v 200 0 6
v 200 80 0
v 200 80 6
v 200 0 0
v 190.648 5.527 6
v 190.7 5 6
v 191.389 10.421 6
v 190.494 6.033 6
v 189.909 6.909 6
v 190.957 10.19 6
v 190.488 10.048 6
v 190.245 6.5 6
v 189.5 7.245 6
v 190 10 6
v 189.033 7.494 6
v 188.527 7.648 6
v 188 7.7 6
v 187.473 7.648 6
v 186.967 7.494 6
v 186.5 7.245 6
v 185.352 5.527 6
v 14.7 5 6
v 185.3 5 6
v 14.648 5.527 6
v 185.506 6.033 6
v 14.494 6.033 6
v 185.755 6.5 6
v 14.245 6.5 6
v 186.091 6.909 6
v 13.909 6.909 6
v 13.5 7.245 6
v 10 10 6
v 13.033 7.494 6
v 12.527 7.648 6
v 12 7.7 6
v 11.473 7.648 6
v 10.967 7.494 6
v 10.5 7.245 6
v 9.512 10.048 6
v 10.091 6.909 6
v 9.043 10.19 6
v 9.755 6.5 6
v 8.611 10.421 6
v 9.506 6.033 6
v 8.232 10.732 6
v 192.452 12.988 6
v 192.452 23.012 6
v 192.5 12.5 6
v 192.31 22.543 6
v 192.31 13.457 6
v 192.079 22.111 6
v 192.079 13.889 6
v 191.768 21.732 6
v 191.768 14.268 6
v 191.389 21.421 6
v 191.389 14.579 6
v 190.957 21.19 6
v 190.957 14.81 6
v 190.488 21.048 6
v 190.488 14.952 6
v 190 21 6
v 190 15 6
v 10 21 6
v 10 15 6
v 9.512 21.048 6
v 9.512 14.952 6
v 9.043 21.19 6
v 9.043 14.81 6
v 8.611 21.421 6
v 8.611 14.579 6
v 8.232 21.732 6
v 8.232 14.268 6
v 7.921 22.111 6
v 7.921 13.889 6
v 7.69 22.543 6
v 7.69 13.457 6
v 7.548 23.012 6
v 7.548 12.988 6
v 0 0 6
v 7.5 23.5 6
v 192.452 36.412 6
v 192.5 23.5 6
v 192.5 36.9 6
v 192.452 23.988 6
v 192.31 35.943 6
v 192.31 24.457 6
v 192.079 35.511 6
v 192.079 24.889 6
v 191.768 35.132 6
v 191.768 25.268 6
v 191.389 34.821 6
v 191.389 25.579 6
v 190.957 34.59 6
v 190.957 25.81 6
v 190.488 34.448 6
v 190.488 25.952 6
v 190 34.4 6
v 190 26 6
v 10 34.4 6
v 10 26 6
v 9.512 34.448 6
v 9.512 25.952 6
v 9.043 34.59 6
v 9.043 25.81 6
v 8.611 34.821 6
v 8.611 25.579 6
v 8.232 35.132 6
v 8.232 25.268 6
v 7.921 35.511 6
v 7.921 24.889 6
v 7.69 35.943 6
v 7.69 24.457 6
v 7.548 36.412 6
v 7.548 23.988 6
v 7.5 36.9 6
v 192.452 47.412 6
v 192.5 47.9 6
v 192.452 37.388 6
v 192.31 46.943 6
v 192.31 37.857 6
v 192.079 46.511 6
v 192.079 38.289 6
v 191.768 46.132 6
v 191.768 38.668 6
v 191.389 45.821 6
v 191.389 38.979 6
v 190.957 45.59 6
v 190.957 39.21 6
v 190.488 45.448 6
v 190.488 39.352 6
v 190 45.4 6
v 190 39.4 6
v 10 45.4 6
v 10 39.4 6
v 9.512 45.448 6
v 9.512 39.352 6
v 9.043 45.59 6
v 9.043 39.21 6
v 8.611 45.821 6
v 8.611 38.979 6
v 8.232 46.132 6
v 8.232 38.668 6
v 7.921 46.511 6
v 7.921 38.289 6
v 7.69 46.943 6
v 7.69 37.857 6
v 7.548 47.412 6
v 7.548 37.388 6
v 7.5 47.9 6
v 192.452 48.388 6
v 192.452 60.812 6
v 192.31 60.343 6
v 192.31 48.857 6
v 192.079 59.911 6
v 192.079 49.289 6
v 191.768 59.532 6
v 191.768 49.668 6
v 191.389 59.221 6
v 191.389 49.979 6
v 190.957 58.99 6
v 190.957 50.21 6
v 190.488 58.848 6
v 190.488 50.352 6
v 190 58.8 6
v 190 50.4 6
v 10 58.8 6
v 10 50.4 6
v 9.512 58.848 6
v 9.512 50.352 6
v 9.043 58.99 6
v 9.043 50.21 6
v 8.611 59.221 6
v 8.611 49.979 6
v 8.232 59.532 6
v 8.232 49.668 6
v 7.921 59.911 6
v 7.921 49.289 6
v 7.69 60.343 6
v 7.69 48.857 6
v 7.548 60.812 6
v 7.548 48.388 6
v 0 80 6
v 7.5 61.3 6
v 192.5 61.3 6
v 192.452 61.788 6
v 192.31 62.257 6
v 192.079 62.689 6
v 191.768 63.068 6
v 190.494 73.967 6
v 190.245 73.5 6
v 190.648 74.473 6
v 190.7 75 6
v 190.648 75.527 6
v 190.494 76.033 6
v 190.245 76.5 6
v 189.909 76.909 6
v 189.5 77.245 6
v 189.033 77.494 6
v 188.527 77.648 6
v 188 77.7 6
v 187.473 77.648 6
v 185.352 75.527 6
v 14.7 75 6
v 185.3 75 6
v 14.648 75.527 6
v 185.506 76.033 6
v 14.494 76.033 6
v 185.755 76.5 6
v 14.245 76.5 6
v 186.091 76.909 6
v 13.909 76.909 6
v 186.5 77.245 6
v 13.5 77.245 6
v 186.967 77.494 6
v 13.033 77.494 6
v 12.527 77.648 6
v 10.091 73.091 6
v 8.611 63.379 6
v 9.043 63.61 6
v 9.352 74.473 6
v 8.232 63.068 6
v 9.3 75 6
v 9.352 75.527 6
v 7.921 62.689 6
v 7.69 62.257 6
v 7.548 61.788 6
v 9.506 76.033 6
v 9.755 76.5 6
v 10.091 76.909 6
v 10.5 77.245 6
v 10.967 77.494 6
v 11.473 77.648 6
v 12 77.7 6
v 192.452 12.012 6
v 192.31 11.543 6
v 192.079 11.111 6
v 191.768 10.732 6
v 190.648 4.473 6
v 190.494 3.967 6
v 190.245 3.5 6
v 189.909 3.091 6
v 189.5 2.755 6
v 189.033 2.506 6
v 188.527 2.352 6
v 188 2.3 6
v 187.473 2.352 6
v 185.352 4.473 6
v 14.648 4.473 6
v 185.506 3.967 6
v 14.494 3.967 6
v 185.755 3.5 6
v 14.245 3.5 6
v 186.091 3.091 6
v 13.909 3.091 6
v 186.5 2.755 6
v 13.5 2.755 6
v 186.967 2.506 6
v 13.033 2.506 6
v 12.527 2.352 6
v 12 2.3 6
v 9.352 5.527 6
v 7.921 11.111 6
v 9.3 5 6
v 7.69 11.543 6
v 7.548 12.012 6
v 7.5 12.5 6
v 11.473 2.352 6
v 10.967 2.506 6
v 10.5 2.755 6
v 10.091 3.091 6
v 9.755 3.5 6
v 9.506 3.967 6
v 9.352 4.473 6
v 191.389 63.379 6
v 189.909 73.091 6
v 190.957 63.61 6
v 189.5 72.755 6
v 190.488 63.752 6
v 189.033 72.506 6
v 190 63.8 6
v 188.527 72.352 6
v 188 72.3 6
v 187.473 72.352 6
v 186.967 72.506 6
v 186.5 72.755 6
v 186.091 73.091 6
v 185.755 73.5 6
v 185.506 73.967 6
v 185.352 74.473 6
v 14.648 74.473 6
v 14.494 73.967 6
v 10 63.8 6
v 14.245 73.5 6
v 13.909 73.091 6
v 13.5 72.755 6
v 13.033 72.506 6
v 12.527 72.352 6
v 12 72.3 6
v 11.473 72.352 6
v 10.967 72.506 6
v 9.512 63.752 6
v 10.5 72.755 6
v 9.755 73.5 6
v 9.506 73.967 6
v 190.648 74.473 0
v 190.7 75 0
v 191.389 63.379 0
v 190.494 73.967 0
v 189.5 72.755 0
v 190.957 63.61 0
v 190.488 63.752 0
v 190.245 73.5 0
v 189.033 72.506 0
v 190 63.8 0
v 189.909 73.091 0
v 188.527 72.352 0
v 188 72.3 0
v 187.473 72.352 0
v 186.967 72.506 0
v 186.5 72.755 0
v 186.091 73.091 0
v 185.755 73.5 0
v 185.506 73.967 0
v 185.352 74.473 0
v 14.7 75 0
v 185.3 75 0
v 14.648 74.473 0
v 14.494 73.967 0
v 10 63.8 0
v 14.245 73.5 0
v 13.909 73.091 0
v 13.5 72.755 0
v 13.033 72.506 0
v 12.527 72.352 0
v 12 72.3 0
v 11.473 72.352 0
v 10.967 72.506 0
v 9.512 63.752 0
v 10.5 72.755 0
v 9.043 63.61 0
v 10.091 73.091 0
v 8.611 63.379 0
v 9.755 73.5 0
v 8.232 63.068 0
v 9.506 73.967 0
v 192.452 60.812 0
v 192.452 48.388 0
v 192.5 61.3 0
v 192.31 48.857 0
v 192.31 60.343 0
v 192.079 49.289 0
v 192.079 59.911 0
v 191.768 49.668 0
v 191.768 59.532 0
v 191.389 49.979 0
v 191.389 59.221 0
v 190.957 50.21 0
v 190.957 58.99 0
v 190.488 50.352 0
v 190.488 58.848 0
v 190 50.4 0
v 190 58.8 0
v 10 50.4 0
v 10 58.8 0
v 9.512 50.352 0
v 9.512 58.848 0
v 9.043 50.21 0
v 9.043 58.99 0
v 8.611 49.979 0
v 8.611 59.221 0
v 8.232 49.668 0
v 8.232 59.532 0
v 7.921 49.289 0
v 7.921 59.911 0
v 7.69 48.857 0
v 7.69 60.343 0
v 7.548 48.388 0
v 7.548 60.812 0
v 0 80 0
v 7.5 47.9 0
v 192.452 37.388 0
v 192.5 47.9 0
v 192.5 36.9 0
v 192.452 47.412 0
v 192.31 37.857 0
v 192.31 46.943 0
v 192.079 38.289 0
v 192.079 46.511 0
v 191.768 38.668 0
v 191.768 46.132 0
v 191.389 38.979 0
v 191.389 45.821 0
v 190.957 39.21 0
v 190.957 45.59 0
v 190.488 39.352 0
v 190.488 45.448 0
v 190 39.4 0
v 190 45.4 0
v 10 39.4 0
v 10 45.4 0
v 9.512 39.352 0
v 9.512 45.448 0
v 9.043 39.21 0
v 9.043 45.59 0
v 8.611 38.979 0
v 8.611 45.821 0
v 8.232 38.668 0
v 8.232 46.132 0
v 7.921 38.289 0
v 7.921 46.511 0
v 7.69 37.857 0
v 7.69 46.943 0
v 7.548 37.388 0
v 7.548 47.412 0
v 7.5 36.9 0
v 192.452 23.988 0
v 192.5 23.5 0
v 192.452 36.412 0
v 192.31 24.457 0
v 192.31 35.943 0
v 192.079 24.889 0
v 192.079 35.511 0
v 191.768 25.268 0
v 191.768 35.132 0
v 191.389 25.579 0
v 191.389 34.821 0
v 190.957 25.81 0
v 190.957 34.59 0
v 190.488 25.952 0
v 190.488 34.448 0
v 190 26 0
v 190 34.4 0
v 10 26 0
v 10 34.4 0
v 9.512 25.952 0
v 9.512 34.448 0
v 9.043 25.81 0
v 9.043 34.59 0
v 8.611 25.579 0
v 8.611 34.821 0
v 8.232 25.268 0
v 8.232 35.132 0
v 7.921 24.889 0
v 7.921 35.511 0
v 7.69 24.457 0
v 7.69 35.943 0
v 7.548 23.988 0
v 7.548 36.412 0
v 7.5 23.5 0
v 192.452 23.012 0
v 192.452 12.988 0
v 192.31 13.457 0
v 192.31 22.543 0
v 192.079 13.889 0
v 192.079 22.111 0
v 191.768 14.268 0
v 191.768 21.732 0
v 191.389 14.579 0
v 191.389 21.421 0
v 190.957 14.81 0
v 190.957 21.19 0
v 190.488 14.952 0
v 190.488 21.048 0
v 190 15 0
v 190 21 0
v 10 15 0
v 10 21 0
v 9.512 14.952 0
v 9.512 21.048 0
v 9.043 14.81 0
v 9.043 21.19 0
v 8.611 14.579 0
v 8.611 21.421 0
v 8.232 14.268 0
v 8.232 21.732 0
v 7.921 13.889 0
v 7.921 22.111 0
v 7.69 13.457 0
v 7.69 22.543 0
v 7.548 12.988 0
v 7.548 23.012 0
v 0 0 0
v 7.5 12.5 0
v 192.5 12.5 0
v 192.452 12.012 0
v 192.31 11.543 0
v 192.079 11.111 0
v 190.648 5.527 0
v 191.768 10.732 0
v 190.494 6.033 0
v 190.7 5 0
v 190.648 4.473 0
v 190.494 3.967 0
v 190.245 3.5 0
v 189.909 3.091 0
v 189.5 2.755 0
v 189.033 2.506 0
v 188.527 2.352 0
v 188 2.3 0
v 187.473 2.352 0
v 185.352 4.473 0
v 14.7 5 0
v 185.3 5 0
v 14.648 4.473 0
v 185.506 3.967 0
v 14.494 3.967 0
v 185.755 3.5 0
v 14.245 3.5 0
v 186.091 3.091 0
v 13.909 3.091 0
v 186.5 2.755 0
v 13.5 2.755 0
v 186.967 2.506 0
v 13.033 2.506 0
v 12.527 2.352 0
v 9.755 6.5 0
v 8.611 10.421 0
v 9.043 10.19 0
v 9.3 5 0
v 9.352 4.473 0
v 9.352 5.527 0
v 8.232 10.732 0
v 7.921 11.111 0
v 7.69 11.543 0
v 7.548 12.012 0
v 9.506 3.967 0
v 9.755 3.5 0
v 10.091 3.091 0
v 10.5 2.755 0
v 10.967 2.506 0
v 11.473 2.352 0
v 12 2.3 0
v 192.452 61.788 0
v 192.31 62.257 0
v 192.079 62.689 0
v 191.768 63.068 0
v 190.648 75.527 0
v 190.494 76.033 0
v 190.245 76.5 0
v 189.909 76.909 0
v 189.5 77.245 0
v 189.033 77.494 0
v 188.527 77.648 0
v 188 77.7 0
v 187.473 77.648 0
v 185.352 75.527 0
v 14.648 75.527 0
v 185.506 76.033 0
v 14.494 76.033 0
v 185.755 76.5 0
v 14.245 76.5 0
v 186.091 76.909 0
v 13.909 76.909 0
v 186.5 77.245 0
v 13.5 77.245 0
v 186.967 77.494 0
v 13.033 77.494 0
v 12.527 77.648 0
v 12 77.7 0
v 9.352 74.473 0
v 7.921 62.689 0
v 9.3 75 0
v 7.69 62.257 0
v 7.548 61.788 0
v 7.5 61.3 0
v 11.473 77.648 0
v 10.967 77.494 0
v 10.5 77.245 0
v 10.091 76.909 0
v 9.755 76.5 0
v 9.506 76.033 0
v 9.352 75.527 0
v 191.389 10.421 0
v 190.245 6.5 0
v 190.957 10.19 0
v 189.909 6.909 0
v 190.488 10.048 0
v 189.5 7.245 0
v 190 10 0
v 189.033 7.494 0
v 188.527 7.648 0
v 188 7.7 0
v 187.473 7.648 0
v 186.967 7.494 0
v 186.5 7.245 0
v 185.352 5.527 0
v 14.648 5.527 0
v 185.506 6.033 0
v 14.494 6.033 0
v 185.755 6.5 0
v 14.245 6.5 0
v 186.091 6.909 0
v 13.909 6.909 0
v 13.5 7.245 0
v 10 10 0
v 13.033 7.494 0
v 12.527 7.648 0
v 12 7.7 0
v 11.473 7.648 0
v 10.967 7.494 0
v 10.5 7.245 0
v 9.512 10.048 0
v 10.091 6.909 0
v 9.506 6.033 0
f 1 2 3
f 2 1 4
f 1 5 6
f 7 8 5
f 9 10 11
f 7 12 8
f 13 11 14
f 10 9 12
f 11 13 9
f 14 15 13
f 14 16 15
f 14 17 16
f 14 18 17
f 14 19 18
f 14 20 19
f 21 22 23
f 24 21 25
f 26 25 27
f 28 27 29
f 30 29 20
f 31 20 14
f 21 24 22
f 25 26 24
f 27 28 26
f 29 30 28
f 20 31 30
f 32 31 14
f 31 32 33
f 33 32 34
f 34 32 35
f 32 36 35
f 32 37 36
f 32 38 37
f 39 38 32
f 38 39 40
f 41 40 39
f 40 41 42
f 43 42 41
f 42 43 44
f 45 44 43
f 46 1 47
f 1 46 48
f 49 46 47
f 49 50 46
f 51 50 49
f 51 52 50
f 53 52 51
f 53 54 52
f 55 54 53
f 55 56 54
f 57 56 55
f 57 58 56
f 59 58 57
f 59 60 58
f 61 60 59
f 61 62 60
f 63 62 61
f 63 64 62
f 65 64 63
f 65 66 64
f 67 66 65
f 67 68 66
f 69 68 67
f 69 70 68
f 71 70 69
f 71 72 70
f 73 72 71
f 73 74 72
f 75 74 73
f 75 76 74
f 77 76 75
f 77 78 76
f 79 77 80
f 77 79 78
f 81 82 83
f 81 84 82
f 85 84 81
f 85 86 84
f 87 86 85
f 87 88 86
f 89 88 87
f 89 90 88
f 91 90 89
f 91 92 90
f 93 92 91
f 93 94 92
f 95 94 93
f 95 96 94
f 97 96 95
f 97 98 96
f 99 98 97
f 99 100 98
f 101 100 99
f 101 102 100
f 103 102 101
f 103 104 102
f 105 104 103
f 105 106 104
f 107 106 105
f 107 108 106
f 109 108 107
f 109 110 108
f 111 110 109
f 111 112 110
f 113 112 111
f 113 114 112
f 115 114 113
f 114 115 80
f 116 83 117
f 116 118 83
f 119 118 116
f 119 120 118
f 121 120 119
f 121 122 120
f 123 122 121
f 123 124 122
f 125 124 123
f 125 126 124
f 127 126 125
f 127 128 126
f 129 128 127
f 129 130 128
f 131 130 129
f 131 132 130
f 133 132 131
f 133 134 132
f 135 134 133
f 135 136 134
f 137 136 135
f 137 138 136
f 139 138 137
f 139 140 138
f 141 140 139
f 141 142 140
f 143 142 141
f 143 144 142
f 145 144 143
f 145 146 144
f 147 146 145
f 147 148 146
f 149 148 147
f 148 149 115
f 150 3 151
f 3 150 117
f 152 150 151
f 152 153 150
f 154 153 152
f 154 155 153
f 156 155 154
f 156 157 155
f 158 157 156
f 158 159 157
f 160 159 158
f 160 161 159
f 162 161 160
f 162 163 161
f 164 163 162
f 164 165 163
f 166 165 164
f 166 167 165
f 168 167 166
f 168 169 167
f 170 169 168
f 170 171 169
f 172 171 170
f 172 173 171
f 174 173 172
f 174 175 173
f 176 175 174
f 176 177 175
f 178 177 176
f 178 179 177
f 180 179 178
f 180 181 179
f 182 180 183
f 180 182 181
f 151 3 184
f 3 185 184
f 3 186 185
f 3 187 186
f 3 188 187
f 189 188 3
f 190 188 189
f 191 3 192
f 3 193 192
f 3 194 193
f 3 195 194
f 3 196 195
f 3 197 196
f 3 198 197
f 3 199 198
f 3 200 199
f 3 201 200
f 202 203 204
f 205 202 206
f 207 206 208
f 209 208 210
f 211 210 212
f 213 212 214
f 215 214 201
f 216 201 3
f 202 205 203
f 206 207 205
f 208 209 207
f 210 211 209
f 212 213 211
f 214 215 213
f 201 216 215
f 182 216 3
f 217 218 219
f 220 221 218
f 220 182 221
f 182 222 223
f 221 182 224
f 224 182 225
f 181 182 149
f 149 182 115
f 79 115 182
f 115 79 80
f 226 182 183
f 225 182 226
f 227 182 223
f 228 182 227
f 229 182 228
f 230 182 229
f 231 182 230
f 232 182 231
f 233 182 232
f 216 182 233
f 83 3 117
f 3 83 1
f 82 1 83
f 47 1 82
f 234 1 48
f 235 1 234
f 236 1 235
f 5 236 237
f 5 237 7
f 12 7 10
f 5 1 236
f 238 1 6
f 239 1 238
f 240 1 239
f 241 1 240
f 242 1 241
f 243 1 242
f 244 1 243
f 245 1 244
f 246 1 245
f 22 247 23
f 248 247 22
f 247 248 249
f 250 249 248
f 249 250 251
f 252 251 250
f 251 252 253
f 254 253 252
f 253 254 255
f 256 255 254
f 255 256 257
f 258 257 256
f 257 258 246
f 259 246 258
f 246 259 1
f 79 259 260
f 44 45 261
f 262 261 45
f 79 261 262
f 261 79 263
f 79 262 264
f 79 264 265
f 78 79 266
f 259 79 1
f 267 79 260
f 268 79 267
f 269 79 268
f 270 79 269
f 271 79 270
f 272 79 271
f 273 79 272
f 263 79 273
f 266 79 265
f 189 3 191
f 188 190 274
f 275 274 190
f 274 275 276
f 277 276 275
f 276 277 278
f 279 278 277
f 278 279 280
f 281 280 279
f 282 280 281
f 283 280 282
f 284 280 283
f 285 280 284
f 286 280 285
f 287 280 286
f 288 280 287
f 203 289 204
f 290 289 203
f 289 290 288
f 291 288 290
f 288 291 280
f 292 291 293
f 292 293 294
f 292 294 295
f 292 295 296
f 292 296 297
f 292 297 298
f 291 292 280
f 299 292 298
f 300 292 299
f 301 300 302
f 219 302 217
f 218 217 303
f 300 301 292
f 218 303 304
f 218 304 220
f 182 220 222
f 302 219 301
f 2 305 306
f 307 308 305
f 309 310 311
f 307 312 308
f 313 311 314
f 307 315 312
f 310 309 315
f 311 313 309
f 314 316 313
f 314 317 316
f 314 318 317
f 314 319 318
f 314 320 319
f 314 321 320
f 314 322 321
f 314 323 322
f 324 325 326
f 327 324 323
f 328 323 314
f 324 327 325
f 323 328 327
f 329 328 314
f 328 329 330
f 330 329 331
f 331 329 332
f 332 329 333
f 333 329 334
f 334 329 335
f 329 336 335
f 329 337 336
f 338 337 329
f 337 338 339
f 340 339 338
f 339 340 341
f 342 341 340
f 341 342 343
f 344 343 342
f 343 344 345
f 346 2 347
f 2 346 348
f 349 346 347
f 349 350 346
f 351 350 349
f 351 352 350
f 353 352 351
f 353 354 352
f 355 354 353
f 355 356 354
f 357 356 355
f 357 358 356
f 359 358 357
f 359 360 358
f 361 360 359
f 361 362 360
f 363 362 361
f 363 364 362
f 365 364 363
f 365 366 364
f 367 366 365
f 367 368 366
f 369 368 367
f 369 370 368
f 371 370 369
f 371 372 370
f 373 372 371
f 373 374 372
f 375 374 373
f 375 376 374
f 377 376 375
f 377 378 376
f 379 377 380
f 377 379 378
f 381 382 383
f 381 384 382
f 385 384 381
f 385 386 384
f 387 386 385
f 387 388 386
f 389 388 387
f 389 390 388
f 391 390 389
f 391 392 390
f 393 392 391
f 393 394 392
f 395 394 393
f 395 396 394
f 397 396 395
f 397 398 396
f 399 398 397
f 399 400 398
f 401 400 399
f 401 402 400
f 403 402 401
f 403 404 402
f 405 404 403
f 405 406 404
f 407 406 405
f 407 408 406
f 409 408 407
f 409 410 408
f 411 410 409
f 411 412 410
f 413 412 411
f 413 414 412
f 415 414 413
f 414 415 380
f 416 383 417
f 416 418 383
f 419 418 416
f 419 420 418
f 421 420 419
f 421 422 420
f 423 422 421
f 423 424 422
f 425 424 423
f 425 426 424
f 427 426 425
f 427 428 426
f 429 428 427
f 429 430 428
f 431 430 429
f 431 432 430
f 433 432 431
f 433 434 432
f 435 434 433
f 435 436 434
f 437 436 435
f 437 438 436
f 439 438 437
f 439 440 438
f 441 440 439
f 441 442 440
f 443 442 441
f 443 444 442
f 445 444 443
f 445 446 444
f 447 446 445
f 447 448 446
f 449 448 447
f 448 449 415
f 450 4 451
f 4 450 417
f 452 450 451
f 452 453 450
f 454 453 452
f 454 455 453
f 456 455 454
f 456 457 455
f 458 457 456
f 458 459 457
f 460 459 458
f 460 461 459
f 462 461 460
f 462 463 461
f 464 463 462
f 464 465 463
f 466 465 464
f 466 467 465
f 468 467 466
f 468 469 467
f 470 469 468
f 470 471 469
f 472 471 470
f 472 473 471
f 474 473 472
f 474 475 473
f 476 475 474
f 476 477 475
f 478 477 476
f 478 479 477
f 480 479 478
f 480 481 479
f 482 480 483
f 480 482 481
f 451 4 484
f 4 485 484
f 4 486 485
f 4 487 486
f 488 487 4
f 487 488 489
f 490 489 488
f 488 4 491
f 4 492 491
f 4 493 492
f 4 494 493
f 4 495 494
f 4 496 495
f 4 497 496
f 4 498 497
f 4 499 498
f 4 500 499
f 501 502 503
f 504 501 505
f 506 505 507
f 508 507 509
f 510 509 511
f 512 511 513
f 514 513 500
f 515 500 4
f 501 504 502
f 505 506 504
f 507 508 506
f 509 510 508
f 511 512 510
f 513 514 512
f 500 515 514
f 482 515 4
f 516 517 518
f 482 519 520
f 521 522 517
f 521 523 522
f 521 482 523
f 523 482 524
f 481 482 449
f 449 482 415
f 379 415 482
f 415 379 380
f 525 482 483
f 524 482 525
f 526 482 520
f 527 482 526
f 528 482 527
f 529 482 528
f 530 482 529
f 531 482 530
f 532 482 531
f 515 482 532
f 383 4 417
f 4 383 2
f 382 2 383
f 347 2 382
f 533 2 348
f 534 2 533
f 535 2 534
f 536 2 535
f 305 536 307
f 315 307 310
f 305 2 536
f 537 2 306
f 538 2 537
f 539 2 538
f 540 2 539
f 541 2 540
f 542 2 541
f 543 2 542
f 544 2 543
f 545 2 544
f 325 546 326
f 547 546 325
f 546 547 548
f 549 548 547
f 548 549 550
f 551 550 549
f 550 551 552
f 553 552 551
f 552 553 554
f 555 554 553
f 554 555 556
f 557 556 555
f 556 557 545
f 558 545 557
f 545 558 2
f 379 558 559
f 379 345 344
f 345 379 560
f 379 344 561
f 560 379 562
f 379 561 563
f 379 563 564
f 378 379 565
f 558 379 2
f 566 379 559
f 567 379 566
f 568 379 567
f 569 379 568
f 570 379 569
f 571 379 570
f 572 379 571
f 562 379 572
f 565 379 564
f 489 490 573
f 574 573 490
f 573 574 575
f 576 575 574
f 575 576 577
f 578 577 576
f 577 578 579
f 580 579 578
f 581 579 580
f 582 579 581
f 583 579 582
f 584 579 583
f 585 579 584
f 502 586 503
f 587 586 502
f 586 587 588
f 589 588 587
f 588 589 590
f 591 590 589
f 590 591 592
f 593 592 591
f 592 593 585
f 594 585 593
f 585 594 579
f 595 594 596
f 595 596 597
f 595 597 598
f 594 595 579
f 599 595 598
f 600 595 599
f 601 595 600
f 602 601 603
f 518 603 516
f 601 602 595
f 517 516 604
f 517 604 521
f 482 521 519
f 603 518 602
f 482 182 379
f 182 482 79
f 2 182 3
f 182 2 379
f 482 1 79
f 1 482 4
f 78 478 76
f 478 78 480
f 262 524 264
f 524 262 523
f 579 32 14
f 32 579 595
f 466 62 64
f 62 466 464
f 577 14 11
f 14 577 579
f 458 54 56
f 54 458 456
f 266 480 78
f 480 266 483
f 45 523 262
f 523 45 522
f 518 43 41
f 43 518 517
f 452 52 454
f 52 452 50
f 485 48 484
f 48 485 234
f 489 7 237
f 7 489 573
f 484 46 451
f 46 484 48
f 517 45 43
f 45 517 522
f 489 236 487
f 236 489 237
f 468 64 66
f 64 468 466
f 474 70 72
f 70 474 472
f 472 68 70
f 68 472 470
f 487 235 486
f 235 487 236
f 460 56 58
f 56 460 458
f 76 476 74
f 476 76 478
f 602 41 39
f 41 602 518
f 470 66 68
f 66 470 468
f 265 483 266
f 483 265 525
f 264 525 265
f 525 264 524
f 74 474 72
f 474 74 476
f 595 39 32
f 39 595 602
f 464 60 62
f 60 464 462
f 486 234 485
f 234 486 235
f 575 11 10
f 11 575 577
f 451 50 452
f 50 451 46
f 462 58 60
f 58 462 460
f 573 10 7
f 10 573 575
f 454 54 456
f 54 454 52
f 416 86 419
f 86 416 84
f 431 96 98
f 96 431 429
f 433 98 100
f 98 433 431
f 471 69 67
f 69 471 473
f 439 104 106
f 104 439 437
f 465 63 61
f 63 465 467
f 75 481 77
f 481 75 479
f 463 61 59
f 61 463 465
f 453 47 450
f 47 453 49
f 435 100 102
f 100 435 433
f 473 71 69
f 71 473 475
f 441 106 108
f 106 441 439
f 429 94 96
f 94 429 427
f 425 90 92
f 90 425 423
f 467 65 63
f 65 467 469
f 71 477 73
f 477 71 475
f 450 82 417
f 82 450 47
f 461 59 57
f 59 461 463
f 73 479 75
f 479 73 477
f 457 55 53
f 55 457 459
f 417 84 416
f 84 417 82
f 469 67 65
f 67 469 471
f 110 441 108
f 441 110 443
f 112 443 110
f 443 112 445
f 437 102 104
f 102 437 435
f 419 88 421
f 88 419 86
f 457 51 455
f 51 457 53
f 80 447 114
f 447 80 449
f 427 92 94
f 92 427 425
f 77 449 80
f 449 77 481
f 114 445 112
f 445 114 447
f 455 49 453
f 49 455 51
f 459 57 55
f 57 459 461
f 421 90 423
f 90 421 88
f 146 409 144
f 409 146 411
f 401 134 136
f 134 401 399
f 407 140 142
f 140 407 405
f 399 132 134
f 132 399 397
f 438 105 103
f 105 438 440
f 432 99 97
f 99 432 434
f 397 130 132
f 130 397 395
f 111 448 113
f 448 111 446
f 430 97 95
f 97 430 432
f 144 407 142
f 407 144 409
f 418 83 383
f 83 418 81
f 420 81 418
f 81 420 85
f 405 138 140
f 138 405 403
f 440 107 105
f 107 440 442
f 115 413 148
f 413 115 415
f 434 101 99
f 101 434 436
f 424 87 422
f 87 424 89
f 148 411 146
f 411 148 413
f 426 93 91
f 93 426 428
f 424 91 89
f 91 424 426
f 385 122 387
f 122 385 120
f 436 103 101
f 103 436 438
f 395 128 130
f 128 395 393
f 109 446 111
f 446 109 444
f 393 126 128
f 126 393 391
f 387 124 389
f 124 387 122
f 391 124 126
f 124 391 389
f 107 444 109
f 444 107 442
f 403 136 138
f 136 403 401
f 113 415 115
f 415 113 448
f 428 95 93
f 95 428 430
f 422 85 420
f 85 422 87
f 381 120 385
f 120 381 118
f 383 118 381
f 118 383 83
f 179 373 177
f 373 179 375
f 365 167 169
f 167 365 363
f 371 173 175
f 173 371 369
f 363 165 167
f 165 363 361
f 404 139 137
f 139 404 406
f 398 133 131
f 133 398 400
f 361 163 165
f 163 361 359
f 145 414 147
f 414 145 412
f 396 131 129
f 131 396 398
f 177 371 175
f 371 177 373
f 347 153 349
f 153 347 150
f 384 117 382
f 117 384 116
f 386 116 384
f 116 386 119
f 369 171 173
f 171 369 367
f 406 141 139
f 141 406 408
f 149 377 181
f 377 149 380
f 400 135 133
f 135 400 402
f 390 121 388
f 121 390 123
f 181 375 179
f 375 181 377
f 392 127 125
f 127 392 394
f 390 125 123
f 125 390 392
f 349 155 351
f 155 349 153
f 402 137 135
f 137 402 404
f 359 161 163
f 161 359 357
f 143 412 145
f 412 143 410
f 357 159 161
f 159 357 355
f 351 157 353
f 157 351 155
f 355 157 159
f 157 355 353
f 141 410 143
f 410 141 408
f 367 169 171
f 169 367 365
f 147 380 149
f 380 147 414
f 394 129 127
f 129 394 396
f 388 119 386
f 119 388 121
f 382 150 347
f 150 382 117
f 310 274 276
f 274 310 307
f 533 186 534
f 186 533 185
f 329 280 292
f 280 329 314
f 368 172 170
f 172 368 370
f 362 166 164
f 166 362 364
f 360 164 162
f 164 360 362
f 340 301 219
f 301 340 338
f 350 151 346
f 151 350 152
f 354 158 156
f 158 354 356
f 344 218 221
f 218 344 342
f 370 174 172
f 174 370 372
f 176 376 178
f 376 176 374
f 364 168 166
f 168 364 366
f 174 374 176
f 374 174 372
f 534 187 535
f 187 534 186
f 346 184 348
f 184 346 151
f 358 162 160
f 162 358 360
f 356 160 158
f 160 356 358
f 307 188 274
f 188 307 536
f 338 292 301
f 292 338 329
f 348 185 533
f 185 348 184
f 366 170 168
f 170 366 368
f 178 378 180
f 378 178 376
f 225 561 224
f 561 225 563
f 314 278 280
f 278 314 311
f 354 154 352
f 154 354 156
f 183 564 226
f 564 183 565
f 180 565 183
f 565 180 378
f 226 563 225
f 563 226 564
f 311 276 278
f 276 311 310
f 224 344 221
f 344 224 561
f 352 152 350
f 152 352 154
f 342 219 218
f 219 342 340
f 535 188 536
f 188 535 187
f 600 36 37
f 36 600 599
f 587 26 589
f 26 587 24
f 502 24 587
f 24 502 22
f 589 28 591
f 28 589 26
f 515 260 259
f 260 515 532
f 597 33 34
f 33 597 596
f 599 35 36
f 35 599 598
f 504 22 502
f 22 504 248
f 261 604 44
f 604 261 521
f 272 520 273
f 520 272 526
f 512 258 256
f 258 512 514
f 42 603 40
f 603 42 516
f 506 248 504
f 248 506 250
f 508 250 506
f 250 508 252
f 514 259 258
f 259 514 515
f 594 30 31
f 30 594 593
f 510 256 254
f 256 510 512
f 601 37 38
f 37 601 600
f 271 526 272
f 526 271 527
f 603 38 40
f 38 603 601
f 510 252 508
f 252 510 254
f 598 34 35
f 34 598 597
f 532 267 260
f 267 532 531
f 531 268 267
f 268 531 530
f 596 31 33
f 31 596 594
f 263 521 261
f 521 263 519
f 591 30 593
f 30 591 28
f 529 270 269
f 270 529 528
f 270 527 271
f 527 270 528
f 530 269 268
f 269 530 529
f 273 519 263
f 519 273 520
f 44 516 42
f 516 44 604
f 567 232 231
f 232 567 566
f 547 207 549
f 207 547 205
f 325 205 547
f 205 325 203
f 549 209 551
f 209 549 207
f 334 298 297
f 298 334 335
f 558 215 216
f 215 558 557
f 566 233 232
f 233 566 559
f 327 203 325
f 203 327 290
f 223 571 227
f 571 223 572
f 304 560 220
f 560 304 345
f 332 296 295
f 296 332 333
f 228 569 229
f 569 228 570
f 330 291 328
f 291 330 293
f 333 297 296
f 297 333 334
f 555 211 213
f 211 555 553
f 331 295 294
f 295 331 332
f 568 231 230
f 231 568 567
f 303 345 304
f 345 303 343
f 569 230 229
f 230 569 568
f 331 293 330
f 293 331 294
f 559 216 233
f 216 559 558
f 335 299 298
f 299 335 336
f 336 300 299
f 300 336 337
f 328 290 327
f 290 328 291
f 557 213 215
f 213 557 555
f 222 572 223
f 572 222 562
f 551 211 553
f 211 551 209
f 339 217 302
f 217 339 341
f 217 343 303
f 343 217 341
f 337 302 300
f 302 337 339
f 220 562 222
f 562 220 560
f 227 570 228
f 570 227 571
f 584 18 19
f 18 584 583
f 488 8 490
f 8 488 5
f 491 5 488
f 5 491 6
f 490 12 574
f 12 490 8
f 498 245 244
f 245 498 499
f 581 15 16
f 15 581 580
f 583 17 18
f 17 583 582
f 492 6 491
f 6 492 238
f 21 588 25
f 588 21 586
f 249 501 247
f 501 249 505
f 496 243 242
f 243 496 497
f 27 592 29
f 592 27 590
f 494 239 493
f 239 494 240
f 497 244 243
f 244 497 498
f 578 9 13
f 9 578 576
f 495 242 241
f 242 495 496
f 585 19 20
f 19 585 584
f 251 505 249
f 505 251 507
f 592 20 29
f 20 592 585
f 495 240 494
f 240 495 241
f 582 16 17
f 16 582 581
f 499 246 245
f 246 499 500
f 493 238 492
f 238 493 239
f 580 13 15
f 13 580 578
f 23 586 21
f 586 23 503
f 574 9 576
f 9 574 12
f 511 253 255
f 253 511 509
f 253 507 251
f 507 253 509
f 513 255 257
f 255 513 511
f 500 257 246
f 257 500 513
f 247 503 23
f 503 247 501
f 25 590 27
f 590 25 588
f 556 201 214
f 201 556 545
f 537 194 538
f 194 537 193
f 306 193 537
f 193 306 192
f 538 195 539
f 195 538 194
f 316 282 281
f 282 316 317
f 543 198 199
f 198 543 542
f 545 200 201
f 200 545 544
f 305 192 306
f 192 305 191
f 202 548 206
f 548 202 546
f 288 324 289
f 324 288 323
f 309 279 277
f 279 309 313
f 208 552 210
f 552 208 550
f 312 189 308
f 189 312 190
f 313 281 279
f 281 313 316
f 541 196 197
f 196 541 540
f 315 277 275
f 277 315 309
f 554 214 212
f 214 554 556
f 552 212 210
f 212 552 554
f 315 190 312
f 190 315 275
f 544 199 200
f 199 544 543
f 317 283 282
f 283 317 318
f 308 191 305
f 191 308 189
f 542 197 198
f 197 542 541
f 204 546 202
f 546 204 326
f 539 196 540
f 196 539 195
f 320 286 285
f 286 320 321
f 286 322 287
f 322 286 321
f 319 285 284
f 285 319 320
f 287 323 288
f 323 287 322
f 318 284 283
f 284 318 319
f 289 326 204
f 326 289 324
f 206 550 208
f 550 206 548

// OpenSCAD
$fn = 32;

// ----------------------------------------------------------------------
// Slotted panel: 200 x 80 mm, 5 рядов of slots
// ----------------------------------------------------------------------

// --- parameters (mm) ---
panel_w = 200;            // panel width
panel_d = 80;             // panel depth
thick = 6;                // panel thickness
slot_w = 5;               // slot width
pitch0 = 11;              // first row pitch
pitch_step = 2.4;         // pitch increase per row
margin = 10;              // margin around the slot field
rows = 5;                 // number of slot rows
mount_d = 5.4;            // mounting holes
mount_x = 88;             // mounting hole offset

difference() {
  union() {
    cube([panel_w, panel_d, thick]);
  }
  /* slot rows: stadium shaped cutters, 2.5 mm clear of both faces */
  /* row 0: pitch 11, length 180 */
  hull() {
    translate([10, 12.5, -2.5]) cylinder(h = thick + 5, d = slot_w);
    translate([190, 12.5, -2.5]) cylinder(h = thick + 5, d = slot_w);
  }
  /* row 1: pitch 13.4, length 180 */
  hull() {
    translate([10, 23.5, -2.5]) cylinder(h = thick + 5, d = slot_w);
    translate([190, 23.5, -2.5]) cylinder(h = thick + 5, d = slot_w);
  }
  /* row 2: pitch 11, length 180 */
  hull() {
    translate([10, 36.9, -2.5]) cylinder(h = thick + 5, d = slot_w);
    translate([190, 36.9, -2.5]) cylinder(h = thick + 5, d = slot_w);
  }
  /* row 3: pitch 13.4, length 180 */
  hull() {
    translate([10, 47.9, -2.5]) cylinder(h = thick + 5, d = slot_w);
    translate([190, 47.9, -2.5]) cylinder(h = thick + 5, d = slot_w);
  }
  /* row 4: pitch 11, length 180 */
  hull() {
    translate([10, 61.3, -2.5]) cylinder(h = thick + 5, d = slot_w);
    translate([190, 61.3, -2.5]) cylinder(h = thick + 5, d = slot_w);
  }
  translate([12, 5, -2.5]) cylinder(h = 11, d = mount_d);
  translate([12, 75, -2.5]) cylinder(h = 11, d = mount_d);
  translate([188, 5, -2.5]) cylinder(h = 11, d = mount_d);
  translate([188, 75, -2.5]) cylinder(h = 11, d = mount_d);
}
